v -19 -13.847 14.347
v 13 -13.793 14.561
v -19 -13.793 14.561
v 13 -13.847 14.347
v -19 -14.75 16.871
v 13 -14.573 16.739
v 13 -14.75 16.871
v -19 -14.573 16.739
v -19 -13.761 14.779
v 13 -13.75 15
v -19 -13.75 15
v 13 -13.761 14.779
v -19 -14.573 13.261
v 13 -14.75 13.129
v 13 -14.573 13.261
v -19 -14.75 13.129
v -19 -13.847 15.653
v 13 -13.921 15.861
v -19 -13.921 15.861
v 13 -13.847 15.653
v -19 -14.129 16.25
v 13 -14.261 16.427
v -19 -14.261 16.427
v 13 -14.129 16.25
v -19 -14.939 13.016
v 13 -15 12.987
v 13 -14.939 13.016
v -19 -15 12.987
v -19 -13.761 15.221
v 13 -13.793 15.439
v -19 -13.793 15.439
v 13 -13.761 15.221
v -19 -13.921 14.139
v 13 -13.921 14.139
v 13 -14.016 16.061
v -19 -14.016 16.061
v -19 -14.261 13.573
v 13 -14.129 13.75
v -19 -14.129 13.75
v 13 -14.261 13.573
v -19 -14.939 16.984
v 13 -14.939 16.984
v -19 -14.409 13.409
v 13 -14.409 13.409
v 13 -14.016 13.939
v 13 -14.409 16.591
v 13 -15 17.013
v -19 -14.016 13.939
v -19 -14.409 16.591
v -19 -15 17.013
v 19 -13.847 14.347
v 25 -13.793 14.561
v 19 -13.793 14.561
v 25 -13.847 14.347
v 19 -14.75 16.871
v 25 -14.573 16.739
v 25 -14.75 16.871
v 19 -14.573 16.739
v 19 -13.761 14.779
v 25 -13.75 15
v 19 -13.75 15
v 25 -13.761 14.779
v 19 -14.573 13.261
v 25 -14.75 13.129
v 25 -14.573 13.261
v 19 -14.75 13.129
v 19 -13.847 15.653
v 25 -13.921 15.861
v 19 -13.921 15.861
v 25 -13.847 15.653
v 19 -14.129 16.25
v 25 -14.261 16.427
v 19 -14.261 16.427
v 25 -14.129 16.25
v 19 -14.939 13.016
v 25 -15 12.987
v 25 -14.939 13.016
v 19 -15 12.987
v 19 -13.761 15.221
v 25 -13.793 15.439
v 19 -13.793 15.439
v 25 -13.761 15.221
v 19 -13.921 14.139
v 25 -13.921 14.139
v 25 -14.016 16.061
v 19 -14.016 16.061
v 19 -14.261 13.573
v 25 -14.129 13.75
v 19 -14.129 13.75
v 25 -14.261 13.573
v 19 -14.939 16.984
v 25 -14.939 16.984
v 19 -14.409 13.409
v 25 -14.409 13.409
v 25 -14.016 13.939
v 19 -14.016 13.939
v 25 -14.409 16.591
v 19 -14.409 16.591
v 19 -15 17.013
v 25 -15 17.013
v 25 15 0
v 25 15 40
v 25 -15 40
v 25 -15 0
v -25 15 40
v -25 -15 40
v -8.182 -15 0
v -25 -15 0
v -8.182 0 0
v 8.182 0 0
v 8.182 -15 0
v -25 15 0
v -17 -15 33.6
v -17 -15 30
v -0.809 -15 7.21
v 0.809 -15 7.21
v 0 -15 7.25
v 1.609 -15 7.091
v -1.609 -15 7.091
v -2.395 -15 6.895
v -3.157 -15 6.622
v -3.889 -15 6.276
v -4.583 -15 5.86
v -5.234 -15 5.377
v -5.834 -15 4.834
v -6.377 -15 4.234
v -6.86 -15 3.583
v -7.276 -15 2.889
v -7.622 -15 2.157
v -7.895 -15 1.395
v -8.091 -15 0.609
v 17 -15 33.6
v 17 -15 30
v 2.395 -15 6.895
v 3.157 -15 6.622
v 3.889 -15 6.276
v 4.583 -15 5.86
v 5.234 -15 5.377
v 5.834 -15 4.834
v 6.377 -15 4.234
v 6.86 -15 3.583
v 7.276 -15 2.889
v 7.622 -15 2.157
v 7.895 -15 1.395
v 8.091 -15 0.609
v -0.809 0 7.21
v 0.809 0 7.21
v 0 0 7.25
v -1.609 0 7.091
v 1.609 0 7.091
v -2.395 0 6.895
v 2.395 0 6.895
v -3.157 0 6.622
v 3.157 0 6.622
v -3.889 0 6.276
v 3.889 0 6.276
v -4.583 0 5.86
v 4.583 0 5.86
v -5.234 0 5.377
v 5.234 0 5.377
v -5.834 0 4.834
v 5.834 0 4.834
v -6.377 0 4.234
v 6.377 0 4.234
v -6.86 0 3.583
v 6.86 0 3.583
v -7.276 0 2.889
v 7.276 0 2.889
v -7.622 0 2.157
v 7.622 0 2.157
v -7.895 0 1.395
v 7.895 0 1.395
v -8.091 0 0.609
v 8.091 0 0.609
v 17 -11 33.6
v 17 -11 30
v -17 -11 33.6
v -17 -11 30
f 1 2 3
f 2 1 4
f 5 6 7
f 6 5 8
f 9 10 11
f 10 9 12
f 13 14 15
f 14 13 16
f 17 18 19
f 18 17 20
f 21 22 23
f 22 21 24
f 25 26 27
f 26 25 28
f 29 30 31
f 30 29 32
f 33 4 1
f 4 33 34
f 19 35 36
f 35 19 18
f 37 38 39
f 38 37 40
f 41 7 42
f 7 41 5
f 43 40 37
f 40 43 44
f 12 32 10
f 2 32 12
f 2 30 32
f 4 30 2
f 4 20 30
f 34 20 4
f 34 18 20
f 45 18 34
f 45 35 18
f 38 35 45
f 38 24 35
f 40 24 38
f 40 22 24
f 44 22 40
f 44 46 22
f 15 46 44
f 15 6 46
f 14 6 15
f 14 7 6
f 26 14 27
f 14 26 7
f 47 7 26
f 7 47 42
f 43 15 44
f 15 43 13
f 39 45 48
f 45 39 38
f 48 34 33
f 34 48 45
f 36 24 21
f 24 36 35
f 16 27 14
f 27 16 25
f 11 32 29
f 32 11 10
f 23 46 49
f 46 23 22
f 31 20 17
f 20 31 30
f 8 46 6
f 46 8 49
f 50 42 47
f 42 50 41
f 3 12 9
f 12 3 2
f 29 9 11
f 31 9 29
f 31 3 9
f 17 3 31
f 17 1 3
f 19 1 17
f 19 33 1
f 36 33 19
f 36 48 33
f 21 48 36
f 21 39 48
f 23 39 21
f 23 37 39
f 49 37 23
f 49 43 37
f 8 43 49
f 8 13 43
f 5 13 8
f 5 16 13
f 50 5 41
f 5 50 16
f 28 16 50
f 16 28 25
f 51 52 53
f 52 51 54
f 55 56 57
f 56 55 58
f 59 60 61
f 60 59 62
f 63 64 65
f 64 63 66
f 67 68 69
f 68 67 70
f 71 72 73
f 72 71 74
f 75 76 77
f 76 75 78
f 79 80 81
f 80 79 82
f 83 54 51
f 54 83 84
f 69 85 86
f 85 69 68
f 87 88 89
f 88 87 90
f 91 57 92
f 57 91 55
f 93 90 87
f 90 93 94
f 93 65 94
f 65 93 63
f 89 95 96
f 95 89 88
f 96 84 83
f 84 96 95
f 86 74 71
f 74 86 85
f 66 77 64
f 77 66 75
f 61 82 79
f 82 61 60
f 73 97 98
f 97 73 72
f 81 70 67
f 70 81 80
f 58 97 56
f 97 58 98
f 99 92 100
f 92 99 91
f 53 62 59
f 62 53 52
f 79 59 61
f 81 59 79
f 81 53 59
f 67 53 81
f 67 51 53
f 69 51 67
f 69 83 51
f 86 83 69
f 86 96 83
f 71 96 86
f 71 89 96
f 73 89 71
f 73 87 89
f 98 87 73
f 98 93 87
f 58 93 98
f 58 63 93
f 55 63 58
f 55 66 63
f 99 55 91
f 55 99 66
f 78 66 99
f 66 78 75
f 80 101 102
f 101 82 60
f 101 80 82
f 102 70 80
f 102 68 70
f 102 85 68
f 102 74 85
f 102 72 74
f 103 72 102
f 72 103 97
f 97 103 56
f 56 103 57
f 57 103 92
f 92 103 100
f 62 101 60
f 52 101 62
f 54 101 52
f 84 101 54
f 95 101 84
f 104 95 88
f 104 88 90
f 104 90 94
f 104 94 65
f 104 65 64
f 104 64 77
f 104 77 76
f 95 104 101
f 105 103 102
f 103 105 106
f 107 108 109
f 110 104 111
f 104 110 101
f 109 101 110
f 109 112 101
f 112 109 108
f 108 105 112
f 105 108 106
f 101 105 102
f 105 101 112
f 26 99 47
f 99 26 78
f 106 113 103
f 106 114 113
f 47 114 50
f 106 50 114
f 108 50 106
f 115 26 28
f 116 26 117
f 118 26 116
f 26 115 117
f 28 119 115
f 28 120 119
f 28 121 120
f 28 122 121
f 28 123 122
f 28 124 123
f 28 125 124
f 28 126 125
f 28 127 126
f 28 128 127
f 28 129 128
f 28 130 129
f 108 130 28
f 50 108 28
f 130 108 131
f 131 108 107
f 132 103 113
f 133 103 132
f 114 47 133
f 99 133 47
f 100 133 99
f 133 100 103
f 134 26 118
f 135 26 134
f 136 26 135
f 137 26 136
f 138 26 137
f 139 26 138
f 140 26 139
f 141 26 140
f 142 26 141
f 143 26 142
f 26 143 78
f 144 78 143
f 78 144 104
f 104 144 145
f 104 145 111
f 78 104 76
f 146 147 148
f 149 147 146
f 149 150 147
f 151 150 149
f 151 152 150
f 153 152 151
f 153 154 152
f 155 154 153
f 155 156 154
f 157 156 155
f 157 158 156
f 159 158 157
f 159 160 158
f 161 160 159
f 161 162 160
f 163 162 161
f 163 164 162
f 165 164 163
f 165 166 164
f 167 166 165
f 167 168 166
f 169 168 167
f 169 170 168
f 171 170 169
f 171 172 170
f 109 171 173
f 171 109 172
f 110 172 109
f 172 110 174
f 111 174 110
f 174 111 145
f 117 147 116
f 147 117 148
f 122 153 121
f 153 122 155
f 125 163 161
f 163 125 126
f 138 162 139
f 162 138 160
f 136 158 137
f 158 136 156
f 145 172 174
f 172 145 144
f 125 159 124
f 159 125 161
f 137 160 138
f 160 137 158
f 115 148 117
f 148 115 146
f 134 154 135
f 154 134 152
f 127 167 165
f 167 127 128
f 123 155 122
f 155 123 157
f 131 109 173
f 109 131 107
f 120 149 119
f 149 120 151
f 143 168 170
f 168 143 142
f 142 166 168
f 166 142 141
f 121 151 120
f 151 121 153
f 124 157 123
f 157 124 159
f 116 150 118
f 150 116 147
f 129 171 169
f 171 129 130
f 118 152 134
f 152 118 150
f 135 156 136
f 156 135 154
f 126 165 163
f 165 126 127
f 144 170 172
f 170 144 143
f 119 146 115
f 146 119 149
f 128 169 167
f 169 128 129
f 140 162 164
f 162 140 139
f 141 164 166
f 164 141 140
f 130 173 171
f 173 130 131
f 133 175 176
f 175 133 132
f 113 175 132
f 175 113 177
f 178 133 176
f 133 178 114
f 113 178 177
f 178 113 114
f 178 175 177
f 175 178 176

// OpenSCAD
// Wall-mounted syringe holder for 10mL syringe
// Designed for FDM printing, resting on the XY plane.

// --- Dimensions ---
block_w      = 50.0;    // Block width (X)
block_d      = 30.0;    // Block depth (Y)
block_h      = 40.0;    // Block height (Z)

barrel_dia   = 16.5;    // Diameter of the syringe barrel channel
barrel_rad   = barrel_dia / 2;

flange_w      = 34.0;    // Width of the flange slot (X)
flange_h      = 2.6;     // Height of the flange slot (Z)
flange_z_min  = 30.0;    // Bottom of the flange slot (Z)
flange_y_end  = 11.0;    // How far back the slot goes (Y)

screw_hole_d  = 4.5;     // Diameter for M4 screws
screw_x_pos   = 19.0;    // X offset for screw holes
screw_z_pos   = 15.0;    // Z height for screw holes

$fn = 64;

// --- Modeling ---

// The main block is centered on X and Y, sitting on Z=0.
// Back face is at Y = 15, Front face is at Y = -15.
// Origin (0,0,0) is the center of the bottom face.

difference() {
    // 1. The main block
    translate([-block_w/2, -block_d/2, 0])
        cube([block_w, block_d, block_h]);

    // 2. The barrel channel
    // A half-circle at the back (y=15) and straight sides to the front (y=-15).
    // The half-circle is centered at x=0, y=0 (relative to the block center).
    // Since the block is 30mm deep, Y goes from -15 to 15.
    // The channel is a semi-cylinder.
    translate([0, 0, -1]) // Extend slightly for clean cut
    rotate([90, 0, 0])    // Rotate cylinder to lie along Y axis
    cylinder(h = block_d + 2, d = barrel_dia);

    // 3. The flange slot
    // Cut from the front face (y = -15) back to y = 11.
    // Width is 34mm (X), Height is 2.6mm (Z).
    translate([-flange_w/2, -block_d/2 - 1, flange_z_min])
        cube([flange_w, (block_d/2 - flange_y_end) + 1, flange_h + 1]);

    // 4. The screw holes
    // Two 4.5mm holes through the block along the Y axis.
    for (sx = [-screw_x_pos, screw_x_pos]) {
        translate([sx, -block_d/2 - 1, screw_z_pos])
            rotate([0, 90, 0])
                cylinder(h = block_d + 2, d = screw_hole_d);
    }
}
